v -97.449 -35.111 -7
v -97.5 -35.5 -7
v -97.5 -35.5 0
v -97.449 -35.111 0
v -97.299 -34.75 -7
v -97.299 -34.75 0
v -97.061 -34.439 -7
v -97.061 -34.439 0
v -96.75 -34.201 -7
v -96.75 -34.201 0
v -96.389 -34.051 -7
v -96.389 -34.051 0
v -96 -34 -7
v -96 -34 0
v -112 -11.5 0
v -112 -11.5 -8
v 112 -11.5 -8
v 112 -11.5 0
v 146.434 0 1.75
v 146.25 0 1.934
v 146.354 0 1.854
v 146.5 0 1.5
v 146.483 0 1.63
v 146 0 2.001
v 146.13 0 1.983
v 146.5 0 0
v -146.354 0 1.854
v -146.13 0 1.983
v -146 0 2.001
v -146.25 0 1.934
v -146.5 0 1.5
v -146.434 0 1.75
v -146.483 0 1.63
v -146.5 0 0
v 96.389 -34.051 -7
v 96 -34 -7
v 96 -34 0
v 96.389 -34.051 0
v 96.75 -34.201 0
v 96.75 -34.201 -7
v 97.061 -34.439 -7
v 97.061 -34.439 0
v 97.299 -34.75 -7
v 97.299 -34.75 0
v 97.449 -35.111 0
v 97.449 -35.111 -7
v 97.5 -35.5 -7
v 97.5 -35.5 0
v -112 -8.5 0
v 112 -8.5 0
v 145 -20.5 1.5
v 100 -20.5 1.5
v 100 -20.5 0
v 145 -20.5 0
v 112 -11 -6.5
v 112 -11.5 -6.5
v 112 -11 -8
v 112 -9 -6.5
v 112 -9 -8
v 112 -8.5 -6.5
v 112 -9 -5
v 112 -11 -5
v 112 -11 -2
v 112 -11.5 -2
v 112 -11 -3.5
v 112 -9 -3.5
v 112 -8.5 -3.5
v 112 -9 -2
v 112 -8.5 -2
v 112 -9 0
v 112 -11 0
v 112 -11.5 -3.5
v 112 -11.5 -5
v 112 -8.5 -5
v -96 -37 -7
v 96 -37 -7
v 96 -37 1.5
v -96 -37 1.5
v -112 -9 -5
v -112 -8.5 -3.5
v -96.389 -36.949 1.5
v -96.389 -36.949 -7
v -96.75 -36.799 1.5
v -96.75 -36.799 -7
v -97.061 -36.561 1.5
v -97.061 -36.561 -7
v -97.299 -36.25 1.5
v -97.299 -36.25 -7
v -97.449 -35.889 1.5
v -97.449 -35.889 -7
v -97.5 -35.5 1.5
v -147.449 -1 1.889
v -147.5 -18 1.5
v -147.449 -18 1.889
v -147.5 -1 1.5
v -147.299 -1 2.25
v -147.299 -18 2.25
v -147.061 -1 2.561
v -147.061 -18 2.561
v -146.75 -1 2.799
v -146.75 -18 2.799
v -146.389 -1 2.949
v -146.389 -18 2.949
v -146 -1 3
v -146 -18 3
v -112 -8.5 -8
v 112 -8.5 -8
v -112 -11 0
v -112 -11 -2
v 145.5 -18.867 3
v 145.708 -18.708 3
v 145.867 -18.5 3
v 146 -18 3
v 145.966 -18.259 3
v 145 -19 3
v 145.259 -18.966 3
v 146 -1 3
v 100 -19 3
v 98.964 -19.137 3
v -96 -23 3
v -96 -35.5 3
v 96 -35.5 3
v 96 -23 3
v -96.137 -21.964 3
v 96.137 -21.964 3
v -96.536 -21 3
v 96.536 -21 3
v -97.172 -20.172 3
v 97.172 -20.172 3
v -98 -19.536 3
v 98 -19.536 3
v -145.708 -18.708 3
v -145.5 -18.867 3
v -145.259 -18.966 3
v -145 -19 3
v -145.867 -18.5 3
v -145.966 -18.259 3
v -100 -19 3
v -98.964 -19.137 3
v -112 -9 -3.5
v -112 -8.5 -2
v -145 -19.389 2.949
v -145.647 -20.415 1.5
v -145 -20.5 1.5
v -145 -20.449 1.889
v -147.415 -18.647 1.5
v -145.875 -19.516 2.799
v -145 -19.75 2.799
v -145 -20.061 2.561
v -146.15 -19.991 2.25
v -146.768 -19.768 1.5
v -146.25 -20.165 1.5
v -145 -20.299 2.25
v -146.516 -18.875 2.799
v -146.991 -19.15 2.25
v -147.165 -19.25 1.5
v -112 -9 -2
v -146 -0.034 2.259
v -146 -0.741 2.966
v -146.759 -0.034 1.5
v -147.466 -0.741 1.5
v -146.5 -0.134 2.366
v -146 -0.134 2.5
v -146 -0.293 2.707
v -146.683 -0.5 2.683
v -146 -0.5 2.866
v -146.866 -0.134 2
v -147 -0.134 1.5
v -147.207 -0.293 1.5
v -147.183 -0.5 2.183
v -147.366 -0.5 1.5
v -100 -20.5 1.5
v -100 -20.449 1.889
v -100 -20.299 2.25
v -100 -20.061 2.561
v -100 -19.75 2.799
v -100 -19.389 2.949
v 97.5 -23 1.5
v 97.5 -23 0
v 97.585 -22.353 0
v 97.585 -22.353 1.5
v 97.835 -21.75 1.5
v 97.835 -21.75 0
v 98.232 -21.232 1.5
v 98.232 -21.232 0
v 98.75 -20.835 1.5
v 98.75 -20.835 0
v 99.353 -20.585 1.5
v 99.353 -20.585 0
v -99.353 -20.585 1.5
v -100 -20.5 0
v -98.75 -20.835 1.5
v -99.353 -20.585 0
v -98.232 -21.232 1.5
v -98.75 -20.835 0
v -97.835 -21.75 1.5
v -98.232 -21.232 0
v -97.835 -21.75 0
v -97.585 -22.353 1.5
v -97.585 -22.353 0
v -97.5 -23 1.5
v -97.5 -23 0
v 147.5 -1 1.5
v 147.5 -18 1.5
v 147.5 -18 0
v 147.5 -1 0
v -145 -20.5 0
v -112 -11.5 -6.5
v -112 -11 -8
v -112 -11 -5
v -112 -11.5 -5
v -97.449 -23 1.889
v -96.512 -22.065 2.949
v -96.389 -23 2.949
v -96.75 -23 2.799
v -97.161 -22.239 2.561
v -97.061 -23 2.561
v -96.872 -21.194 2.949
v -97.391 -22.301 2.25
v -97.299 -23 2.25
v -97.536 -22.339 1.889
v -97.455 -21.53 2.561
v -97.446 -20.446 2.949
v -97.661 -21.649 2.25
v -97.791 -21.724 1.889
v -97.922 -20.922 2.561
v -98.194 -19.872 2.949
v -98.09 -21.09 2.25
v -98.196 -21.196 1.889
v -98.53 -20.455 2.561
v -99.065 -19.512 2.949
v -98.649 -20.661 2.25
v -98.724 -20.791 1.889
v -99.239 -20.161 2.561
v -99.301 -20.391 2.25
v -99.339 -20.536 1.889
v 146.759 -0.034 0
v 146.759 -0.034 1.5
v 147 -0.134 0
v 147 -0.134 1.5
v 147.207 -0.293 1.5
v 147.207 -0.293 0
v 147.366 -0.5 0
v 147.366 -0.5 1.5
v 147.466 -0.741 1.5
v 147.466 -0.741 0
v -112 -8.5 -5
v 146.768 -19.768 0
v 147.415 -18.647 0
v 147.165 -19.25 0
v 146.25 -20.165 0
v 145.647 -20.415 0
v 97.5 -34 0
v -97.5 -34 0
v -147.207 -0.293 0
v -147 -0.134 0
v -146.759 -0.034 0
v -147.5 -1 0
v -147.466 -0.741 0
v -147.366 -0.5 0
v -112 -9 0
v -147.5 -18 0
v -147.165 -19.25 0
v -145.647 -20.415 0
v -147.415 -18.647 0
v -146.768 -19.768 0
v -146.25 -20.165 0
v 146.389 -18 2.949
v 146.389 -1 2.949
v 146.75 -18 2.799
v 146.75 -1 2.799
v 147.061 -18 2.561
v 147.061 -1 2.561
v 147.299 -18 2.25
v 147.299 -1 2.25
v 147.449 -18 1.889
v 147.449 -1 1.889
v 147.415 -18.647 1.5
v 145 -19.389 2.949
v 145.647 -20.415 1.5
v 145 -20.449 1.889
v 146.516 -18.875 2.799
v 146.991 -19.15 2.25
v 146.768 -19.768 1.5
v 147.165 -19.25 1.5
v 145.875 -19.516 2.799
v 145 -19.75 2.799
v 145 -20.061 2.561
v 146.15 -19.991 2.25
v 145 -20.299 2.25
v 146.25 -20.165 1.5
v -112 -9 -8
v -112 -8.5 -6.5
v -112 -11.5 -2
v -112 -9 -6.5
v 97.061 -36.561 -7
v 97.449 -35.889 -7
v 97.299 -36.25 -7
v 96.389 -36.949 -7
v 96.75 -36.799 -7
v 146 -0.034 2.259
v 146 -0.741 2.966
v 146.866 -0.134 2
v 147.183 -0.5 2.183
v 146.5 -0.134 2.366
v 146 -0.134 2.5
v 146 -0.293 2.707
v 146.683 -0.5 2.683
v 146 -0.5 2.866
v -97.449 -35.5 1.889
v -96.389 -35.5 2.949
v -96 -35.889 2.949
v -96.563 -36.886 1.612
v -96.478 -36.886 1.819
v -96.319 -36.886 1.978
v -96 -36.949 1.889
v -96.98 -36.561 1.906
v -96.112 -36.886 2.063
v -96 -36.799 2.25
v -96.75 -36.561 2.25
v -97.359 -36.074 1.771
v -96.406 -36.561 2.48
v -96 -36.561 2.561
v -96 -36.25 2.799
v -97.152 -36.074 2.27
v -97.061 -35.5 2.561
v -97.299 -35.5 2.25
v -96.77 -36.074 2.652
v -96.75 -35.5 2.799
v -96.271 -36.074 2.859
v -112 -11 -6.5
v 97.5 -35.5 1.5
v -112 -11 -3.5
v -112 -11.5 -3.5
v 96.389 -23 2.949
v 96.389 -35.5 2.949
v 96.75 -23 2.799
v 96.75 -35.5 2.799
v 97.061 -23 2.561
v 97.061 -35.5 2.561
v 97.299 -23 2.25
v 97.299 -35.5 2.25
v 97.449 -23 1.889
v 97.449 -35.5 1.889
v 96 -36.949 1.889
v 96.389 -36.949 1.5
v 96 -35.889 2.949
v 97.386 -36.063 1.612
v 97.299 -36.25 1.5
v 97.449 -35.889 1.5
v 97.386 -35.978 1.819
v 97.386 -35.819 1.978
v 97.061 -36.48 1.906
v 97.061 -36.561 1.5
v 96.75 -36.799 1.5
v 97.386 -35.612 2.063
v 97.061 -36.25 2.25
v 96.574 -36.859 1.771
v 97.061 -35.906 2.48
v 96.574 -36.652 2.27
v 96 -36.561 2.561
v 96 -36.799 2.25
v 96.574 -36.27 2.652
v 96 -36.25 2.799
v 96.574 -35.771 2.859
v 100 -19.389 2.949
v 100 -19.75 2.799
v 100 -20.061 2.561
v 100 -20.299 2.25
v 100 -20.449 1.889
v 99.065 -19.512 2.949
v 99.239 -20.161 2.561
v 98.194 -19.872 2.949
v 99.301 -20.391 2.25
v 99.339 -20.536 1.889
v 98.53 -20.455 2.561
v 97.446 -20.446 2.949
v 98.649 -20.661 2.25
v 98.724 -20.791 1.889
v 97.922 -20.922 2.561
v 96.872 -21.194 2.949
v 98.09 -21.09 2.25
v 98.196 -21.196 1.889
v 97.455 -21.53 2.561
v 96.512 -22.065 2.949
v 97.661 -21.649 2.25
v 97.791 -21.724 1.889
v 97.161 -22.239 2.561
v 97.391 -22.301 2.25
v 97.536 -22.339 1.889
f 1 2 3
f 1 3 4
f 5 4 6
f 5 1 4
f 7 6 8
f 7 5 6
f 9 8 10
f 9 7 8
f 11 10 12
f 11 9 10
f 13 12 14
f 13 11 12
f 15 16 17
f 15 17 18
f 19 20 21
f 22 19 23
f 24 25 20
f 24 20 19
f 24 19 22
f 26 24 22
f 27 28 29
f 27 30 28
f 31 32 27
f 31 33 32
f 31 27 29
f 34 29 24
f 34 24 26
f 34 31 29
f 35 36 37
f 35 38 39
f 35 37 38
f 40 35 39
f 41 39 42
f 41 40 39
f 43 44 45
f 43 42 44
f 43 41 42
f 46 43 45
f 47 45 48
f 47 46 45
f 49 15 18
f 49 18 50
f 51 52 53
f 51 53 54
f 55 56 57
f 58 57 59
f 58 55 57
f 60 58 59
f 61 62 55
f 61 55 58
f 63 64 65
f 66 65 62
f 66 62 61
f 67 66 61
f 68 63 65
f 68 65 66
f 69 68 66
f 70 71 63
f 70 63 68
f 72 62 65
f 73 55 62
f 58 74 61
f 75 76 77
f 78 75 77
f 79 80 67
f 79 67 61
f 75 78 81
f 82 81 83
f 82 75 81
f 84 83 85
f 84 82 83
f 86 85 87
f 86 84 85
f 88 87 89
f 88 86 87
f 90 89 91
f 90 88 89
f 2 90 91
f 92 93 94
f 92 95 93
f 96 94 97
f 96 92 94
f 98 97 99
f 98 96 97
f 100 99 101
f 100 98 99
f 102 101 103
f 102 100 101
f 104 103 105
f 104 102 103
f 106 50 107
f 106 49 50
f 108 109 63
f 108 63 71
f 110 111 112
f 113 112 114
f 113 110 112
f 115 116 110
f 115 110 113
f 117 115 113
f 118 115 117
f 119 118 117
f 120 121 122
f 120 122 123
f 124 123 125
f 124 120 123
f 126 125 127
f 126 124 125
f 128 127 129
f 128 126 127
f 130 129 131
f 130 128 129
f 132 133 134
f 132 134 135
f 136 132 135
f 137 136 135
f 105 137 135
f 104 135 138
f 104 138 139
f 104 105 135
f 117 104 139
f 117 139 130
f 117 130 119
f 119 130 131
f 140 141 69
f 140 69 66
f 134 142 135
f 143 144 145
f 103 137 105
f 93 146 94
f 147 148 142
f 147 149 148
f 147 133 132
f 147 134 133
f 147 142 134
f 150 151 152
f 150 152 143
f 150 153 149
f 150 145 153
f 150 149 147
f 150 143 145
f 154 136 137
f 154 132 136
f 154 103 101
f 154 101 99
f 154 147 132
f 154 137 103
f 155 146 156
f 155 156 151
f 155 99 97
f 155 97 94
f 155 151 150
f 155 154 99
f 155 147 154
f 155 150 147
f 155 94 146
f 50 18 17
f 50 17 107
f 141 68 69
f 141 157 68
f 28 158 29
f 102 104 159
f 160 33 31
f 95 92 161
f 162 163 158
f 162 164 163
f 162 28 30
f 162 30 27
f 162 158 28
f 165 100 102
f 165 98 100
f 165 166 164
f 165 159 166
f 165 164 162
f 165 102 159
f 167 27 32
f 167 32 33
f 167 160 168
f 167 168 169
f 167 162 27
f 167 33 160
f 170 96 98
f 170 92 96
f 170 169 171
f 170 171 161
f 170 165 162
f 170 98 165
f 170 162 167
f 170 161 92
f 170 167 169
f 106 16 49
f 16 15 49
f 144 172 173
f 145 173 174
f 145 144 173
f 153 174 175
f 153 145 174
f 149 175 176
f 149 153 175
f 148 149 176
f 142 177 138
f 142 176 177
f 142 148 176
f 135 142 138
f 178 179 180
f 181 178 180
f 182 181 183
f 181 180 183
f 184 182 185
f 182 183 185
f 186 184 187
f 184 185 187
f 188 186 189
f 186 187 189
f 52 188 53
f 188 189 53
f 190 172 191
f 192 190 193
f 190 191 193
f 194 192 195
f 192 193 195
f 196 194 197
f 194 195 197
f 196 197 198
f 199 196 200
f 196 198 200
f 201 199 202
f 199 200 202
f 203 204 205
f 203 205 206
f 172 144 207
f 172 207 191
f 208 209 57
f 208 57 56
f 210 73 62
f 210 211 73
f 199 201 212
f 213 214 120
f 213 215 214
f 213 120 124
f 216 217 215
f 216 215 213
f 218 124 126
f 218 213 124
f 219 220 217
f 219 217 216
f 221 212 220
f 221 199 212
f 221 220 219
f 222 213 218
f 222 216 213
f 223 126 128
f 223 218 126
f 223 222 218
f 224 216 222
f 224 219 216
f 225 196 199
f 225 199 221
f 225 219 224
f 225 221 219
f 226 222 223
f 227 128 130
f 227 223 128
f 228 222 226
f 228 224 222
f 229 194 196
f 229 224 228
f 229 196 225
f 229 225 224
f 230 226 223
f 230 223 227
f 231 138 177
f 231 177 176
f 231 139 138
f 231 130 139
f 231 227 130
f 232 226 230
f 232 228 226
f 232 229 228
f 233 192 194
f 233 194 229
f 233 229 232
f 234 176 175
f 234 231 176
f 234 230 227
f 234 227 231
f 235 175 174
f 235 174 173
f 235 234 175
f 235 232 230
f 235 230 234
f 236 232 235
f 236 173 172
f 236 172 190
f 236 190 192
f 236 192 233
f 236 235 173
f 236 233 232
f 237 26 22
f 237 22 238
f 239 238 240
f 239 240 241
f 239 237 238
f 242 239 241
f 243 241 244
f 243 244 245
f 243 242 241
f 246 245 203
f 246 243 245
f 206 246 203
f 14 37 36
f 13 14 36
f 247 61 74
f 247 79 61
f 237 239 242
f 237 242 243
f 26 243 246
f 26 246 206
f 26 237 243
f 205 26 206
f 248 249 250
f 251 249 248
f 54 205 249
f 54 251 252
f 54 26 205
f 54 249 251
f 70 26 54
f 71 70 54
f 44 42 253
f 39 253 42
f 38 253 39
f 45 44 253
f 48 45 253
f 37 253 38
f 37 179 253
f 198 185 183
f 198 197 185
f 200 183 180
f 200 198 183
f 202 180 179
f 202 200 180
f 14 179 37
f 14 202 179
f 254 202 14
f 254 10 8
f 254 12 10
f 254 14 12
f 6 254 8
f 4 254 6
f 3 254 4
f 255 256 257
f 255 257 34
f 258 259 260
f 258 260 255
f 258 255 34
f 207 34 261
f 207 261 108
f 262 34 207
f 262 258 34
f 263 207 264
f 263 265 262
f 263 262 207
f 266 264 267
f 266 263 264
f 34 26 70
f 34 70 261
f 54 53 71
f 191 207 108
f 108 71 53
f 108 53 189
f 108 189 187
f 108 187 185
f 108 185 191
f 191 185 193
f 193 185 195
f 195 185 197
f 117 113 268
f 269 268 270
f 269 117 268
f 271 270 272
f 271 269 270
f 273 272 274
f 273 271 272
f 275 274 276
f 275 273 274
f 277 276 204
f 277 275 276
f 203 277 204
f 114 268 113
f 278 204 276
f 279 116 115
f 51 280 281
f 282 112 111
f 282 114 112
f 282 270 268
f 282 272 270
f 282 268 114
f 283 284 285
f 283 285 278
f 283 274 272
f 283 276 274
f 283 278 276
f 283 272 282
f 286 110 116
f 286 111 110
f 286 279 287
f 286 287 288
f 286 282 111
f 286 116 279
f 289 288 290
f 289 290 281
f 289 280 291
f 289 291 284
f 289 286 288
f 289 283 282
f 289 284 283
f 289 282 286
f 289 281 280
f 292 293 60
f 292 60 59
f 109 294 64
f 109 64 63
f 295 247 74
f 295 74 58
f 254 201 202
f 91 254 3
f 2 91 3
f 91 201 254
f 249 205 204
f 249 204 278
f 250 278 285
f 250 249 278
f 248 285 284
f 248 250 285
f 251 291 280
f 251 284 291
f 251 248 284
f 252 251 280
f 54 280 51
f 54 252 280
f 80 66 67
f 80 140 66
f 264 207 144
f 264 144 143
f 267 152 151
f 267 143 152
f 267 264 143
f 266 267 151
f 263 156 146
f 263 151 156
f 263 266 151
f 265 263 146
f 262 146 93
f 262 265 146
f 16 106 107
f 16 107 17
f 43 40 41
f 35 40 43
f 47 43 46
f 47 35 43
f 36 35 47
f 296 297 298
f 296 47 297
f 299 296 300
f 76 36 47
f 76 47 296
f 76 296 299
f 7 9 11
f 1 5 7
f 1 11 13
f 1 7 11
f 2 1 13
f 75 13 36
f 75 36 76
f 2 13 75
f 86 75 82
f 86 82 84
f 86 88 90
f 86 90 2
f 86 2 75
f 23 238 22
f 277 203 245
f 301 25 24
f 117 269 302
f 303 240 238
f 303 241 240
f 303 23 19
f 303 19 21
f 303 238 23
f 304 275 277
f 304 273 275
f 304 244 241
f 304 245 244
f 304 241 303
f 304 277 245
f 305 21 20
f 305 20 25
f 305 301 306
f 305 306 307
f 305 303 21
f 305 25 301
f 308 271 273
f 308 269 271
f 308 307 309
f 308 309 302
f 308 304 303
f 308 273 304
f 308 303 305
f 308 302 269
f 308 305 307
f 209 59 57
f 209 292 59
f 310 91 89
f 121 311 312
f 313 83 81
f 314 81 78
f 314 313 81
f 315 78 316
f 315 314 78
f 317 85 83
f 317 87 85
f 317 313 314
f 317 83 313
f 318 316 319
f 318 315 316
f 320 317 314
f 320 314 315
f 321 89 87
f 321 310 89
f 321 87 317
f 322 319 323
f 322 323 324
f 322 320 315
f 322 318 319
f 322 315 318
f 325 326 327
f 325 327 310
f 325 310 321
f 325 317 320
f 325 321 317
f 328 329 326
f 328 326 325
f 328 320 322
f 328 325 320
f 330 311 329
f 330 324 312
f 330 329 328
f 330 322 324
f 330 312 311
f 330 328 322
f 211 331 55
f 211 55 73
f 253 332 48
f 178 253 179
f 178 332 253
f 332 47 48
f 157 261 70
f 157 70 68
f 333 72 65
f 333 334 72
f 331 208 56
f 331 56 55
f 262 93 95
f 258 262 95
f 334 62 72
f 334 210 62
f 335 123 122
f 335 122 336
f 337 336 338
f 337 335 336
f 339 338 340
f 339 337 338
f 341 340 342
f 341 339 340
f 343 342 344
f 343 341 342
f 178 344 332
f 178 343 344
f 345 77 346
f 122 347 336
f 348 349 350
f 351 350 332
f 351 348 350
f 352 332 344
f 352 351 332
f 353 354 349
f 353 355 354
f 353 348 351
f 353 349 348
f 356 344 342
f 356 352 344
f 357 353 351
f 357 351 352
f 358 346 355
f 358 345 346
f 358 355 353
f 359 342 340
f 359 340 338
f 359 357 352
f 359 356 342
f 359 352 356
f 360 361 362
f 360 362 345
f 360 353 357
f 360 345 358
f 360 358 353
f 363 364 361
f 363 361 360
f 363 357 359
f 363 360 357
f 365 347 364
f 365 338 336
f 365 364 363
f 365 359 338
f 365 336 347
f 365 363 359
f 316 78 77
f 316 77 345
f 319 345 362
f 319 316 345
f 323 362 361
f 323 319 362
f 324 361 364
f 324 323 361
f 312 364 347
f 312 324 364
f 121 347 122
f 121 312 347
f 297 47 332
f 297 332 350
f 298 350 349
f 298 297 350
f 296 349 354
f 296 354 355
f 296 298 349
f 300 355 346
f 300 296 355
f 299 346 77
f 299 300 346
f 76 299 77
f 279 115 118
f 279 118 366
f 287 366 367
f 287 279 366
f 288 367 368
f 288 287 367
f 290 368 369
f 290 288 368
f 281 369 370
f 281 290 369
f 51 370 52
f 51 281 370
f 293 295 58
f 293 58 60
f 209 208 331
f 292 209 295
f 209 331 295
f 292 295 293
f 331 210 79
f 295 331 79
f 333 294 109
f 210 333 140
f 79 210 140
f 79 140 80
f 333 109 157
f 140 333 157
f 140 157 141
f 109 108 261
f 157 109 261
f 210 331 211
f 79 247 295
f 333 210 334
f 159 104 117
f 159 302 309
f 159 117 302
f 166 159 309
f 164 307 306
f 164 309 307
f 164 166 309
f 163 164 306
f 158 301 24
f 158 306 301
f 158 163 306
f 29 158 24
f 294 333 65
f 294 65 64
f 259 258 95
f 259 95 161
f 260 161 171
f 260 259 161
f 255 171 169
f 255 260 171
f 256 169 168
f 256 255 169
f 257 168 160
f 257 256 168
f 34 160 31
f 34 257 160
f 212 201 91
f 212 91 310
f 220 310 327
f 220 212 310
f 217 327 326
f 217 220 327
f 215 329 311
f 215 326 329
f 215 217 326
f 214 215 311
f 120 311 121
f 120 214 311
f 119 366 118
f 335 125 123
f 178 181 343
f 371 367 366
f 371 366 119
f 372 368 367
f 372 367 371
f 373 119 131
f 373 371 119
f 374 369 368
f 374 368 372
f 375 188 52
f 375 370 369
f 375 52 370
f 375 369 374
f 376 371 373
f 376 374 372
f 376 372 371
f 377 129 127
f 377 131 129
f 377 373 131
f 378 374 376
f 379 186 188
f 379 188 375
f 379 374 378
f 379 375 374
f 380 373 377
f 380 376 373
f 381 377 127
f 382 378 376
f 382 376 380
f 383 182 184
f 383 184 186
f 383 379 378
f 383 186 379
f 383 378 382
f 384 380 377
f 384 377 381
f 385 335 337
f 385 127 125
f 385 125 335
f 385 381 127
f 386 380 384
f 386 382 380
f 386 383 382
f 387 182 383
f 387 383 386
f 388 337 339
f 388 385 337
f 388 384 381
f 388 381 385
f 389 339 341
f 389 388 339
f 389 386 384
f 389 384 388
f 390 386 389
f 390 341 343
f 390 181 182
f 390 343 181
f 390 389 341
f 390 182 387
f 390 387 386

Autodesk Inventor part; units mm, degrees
ref_plane "YZ Plane" through (0, 0, 0) normal (1, 0, 0) x (0, 1, 0)
ref_plane "XZ Plane" through (0, 0, 0) normal (0, 1, 0) x (-1, 0, 0)
ref_plane "XY Plane" through (0, 0, 0) normal (0, 0, 1) x (1, 0, 0)
sketch "Sketch1" plane through (0, 0, 0) normal (1, 0, 0) x (0, 1, 0)
  line L0 (-37, -7) -> (-37, 3)
  line L1 (-37, 3) -> (0, 3)
  line L2 (0, 3) -> (0, 0)
  line L3 (0, 0) -> (-34, 0)
  line L4 (-34, 0) -> (-34, -7)
  line L5 (-34, -7) -> (-37, -7)
  dimension "d0" = 37
  dimension "d1" = 10
  dimension "d2" = 3
extrude "handle_ex" add sketch "Sketch1" along normal mid plane 295
sketch "Sketch2" plane through (-147.5, -37, 3) normal (0, 0, 1) x (1, 0, 0)
  line L0 (245, 16.5) -> (295, 16.5)
  line L1 (295, 16.5) -> (295, 0)
  line L2 (295, 0) -> (245, 0)
  line L3 (245, 0) -> (245, 16.5)
  line L4 (0, 0) -> (295, 0) projected
  line L5 (295, 37) -> (295, 0) projected
  point P0 (147.5, 37)
  dimension "d5" = 50
  dimension "d6" = 16.5
extrude "handle_cutouts" cut sketch "Sketch2" against normal through all
mirror "handle_cutouts_mirror" about plane through (0, 0, 0) normal (1, 0, 0) of "handle_cutouts"
sketch "Sketch3" plane through (0, 0, 0) normal (1, 0, 0) x (0, 1, 0)
  line L0 (-11, -8) -> (-11.5, -6.5)
  line L1 (-11.5, -6.5) -> (-11, -6.5)
  line L2 (-11, -6.5) -> (-11.5, -5)
  line L3 (-11.5, -5) -> (-11, -5)
  line L4 (-11, -5) -> (-11.5, -3.5)
  line L5 (-11.5, -3.5) -> (-11, -3.5)
  line L6 (-11, -3.5) -> (-11.5, -2)
  line L7 (-11.5, -2) -> (-11, -2)
  line L8 (-11, -2) -> (-11, 0)
  line L9 (-11, 0) -> (-9, 0)
  line L10 (-9, 0) -> (-9, -2)
  line L11 (-9, -2) -> (-8.5, -2)
  line L12 (-8.5, -2) -> (-9, -3.5)
  line L13 (-9, -3.5) -> (-8.5, -3.5)
  line L14 (-8.5, -3.5) -> (-9, -5)
  line L15 (-9, -5) -> (-8.5, -5)
  line L16 (-8.5, -5) -> (-9, -6.5)
  line L17 (-9, -6.5) -> (-8.5, -6.5)
  line L18 (-8.5, -6.5) -> (-9, -8)
  line L19 (-9, -8) -> (-11, -8)
  line L20 (-20.5, 0) -> (0, 0) projected
  line L21 (0, 0) -> (0, 3) projected
  dimension "d9" = 0.5
  dimension "d11" = 1.5
  dimension "d12" = 2
  dimension "d13" = 2
  dimension "d14" = 8
  dimension "d15" = 8.5
extrude "harpoon_wedge" add sketch "Sketch3" along normal mid plane 224
fillet "fillet" radius 2.5 4 edges at (97.5, -20.5, 1.5) (147.5, -20.5, 1.5) (-97.5, -20.5, 1.5) (-147.5, -20.5, 1.5)
fillet "fillet" radius 1.5 11 edges at (-147.5, -10.25, 3) (-122.5, -20.5, 3) (-97.5, -28.75, 3) (0, -37, 3) (-97.5, -37, -2) (-97.5, -34, -3.5) (97.5, -28.75, 3) (97.5, -37, -2) (97.5, -34, -3.5) (122.5, -20.5, 3) (147.5, -10.25, 3)
fillet "fillet" radius 1 3 edges at (147.5, 0, 1.5) (0, 0, 3) (-147.5, 0, 1.5)
sketch "Sketch4" plane through (0, 0, 0) normal (1, 0, 0) x (0, 1, 0)
  line L0 (-11.5, 0) -> (-8.5, 0)
  line L1 (-8.5, 0) -> (-8.5, -8)
  line L2 (-8.5, -8) -> (-11.5, -8)
  line L3 (-11.5, -8) -> (-11.5, 0)
  line L4 (-11, -8) -> (-9, -8) projected
  point P0 (0, 0)
  point P1 (-10, -8)
  point P2 (-10, -8)
  dimension "d21" = 3
  dimension "d22" = 8
extrude "cut_body" add sketch "Sketch4" along normal mid plane 224 separate body
equation "\"d3\" = Length"
equation "\"d23\" = d16"
equation "\"Length\" = 295"
equation "\"d16\" = 224"
properties part number "Häfele Alu profile 126.26.201 295 mm Chrome polished" material "Aluminum 6061"
